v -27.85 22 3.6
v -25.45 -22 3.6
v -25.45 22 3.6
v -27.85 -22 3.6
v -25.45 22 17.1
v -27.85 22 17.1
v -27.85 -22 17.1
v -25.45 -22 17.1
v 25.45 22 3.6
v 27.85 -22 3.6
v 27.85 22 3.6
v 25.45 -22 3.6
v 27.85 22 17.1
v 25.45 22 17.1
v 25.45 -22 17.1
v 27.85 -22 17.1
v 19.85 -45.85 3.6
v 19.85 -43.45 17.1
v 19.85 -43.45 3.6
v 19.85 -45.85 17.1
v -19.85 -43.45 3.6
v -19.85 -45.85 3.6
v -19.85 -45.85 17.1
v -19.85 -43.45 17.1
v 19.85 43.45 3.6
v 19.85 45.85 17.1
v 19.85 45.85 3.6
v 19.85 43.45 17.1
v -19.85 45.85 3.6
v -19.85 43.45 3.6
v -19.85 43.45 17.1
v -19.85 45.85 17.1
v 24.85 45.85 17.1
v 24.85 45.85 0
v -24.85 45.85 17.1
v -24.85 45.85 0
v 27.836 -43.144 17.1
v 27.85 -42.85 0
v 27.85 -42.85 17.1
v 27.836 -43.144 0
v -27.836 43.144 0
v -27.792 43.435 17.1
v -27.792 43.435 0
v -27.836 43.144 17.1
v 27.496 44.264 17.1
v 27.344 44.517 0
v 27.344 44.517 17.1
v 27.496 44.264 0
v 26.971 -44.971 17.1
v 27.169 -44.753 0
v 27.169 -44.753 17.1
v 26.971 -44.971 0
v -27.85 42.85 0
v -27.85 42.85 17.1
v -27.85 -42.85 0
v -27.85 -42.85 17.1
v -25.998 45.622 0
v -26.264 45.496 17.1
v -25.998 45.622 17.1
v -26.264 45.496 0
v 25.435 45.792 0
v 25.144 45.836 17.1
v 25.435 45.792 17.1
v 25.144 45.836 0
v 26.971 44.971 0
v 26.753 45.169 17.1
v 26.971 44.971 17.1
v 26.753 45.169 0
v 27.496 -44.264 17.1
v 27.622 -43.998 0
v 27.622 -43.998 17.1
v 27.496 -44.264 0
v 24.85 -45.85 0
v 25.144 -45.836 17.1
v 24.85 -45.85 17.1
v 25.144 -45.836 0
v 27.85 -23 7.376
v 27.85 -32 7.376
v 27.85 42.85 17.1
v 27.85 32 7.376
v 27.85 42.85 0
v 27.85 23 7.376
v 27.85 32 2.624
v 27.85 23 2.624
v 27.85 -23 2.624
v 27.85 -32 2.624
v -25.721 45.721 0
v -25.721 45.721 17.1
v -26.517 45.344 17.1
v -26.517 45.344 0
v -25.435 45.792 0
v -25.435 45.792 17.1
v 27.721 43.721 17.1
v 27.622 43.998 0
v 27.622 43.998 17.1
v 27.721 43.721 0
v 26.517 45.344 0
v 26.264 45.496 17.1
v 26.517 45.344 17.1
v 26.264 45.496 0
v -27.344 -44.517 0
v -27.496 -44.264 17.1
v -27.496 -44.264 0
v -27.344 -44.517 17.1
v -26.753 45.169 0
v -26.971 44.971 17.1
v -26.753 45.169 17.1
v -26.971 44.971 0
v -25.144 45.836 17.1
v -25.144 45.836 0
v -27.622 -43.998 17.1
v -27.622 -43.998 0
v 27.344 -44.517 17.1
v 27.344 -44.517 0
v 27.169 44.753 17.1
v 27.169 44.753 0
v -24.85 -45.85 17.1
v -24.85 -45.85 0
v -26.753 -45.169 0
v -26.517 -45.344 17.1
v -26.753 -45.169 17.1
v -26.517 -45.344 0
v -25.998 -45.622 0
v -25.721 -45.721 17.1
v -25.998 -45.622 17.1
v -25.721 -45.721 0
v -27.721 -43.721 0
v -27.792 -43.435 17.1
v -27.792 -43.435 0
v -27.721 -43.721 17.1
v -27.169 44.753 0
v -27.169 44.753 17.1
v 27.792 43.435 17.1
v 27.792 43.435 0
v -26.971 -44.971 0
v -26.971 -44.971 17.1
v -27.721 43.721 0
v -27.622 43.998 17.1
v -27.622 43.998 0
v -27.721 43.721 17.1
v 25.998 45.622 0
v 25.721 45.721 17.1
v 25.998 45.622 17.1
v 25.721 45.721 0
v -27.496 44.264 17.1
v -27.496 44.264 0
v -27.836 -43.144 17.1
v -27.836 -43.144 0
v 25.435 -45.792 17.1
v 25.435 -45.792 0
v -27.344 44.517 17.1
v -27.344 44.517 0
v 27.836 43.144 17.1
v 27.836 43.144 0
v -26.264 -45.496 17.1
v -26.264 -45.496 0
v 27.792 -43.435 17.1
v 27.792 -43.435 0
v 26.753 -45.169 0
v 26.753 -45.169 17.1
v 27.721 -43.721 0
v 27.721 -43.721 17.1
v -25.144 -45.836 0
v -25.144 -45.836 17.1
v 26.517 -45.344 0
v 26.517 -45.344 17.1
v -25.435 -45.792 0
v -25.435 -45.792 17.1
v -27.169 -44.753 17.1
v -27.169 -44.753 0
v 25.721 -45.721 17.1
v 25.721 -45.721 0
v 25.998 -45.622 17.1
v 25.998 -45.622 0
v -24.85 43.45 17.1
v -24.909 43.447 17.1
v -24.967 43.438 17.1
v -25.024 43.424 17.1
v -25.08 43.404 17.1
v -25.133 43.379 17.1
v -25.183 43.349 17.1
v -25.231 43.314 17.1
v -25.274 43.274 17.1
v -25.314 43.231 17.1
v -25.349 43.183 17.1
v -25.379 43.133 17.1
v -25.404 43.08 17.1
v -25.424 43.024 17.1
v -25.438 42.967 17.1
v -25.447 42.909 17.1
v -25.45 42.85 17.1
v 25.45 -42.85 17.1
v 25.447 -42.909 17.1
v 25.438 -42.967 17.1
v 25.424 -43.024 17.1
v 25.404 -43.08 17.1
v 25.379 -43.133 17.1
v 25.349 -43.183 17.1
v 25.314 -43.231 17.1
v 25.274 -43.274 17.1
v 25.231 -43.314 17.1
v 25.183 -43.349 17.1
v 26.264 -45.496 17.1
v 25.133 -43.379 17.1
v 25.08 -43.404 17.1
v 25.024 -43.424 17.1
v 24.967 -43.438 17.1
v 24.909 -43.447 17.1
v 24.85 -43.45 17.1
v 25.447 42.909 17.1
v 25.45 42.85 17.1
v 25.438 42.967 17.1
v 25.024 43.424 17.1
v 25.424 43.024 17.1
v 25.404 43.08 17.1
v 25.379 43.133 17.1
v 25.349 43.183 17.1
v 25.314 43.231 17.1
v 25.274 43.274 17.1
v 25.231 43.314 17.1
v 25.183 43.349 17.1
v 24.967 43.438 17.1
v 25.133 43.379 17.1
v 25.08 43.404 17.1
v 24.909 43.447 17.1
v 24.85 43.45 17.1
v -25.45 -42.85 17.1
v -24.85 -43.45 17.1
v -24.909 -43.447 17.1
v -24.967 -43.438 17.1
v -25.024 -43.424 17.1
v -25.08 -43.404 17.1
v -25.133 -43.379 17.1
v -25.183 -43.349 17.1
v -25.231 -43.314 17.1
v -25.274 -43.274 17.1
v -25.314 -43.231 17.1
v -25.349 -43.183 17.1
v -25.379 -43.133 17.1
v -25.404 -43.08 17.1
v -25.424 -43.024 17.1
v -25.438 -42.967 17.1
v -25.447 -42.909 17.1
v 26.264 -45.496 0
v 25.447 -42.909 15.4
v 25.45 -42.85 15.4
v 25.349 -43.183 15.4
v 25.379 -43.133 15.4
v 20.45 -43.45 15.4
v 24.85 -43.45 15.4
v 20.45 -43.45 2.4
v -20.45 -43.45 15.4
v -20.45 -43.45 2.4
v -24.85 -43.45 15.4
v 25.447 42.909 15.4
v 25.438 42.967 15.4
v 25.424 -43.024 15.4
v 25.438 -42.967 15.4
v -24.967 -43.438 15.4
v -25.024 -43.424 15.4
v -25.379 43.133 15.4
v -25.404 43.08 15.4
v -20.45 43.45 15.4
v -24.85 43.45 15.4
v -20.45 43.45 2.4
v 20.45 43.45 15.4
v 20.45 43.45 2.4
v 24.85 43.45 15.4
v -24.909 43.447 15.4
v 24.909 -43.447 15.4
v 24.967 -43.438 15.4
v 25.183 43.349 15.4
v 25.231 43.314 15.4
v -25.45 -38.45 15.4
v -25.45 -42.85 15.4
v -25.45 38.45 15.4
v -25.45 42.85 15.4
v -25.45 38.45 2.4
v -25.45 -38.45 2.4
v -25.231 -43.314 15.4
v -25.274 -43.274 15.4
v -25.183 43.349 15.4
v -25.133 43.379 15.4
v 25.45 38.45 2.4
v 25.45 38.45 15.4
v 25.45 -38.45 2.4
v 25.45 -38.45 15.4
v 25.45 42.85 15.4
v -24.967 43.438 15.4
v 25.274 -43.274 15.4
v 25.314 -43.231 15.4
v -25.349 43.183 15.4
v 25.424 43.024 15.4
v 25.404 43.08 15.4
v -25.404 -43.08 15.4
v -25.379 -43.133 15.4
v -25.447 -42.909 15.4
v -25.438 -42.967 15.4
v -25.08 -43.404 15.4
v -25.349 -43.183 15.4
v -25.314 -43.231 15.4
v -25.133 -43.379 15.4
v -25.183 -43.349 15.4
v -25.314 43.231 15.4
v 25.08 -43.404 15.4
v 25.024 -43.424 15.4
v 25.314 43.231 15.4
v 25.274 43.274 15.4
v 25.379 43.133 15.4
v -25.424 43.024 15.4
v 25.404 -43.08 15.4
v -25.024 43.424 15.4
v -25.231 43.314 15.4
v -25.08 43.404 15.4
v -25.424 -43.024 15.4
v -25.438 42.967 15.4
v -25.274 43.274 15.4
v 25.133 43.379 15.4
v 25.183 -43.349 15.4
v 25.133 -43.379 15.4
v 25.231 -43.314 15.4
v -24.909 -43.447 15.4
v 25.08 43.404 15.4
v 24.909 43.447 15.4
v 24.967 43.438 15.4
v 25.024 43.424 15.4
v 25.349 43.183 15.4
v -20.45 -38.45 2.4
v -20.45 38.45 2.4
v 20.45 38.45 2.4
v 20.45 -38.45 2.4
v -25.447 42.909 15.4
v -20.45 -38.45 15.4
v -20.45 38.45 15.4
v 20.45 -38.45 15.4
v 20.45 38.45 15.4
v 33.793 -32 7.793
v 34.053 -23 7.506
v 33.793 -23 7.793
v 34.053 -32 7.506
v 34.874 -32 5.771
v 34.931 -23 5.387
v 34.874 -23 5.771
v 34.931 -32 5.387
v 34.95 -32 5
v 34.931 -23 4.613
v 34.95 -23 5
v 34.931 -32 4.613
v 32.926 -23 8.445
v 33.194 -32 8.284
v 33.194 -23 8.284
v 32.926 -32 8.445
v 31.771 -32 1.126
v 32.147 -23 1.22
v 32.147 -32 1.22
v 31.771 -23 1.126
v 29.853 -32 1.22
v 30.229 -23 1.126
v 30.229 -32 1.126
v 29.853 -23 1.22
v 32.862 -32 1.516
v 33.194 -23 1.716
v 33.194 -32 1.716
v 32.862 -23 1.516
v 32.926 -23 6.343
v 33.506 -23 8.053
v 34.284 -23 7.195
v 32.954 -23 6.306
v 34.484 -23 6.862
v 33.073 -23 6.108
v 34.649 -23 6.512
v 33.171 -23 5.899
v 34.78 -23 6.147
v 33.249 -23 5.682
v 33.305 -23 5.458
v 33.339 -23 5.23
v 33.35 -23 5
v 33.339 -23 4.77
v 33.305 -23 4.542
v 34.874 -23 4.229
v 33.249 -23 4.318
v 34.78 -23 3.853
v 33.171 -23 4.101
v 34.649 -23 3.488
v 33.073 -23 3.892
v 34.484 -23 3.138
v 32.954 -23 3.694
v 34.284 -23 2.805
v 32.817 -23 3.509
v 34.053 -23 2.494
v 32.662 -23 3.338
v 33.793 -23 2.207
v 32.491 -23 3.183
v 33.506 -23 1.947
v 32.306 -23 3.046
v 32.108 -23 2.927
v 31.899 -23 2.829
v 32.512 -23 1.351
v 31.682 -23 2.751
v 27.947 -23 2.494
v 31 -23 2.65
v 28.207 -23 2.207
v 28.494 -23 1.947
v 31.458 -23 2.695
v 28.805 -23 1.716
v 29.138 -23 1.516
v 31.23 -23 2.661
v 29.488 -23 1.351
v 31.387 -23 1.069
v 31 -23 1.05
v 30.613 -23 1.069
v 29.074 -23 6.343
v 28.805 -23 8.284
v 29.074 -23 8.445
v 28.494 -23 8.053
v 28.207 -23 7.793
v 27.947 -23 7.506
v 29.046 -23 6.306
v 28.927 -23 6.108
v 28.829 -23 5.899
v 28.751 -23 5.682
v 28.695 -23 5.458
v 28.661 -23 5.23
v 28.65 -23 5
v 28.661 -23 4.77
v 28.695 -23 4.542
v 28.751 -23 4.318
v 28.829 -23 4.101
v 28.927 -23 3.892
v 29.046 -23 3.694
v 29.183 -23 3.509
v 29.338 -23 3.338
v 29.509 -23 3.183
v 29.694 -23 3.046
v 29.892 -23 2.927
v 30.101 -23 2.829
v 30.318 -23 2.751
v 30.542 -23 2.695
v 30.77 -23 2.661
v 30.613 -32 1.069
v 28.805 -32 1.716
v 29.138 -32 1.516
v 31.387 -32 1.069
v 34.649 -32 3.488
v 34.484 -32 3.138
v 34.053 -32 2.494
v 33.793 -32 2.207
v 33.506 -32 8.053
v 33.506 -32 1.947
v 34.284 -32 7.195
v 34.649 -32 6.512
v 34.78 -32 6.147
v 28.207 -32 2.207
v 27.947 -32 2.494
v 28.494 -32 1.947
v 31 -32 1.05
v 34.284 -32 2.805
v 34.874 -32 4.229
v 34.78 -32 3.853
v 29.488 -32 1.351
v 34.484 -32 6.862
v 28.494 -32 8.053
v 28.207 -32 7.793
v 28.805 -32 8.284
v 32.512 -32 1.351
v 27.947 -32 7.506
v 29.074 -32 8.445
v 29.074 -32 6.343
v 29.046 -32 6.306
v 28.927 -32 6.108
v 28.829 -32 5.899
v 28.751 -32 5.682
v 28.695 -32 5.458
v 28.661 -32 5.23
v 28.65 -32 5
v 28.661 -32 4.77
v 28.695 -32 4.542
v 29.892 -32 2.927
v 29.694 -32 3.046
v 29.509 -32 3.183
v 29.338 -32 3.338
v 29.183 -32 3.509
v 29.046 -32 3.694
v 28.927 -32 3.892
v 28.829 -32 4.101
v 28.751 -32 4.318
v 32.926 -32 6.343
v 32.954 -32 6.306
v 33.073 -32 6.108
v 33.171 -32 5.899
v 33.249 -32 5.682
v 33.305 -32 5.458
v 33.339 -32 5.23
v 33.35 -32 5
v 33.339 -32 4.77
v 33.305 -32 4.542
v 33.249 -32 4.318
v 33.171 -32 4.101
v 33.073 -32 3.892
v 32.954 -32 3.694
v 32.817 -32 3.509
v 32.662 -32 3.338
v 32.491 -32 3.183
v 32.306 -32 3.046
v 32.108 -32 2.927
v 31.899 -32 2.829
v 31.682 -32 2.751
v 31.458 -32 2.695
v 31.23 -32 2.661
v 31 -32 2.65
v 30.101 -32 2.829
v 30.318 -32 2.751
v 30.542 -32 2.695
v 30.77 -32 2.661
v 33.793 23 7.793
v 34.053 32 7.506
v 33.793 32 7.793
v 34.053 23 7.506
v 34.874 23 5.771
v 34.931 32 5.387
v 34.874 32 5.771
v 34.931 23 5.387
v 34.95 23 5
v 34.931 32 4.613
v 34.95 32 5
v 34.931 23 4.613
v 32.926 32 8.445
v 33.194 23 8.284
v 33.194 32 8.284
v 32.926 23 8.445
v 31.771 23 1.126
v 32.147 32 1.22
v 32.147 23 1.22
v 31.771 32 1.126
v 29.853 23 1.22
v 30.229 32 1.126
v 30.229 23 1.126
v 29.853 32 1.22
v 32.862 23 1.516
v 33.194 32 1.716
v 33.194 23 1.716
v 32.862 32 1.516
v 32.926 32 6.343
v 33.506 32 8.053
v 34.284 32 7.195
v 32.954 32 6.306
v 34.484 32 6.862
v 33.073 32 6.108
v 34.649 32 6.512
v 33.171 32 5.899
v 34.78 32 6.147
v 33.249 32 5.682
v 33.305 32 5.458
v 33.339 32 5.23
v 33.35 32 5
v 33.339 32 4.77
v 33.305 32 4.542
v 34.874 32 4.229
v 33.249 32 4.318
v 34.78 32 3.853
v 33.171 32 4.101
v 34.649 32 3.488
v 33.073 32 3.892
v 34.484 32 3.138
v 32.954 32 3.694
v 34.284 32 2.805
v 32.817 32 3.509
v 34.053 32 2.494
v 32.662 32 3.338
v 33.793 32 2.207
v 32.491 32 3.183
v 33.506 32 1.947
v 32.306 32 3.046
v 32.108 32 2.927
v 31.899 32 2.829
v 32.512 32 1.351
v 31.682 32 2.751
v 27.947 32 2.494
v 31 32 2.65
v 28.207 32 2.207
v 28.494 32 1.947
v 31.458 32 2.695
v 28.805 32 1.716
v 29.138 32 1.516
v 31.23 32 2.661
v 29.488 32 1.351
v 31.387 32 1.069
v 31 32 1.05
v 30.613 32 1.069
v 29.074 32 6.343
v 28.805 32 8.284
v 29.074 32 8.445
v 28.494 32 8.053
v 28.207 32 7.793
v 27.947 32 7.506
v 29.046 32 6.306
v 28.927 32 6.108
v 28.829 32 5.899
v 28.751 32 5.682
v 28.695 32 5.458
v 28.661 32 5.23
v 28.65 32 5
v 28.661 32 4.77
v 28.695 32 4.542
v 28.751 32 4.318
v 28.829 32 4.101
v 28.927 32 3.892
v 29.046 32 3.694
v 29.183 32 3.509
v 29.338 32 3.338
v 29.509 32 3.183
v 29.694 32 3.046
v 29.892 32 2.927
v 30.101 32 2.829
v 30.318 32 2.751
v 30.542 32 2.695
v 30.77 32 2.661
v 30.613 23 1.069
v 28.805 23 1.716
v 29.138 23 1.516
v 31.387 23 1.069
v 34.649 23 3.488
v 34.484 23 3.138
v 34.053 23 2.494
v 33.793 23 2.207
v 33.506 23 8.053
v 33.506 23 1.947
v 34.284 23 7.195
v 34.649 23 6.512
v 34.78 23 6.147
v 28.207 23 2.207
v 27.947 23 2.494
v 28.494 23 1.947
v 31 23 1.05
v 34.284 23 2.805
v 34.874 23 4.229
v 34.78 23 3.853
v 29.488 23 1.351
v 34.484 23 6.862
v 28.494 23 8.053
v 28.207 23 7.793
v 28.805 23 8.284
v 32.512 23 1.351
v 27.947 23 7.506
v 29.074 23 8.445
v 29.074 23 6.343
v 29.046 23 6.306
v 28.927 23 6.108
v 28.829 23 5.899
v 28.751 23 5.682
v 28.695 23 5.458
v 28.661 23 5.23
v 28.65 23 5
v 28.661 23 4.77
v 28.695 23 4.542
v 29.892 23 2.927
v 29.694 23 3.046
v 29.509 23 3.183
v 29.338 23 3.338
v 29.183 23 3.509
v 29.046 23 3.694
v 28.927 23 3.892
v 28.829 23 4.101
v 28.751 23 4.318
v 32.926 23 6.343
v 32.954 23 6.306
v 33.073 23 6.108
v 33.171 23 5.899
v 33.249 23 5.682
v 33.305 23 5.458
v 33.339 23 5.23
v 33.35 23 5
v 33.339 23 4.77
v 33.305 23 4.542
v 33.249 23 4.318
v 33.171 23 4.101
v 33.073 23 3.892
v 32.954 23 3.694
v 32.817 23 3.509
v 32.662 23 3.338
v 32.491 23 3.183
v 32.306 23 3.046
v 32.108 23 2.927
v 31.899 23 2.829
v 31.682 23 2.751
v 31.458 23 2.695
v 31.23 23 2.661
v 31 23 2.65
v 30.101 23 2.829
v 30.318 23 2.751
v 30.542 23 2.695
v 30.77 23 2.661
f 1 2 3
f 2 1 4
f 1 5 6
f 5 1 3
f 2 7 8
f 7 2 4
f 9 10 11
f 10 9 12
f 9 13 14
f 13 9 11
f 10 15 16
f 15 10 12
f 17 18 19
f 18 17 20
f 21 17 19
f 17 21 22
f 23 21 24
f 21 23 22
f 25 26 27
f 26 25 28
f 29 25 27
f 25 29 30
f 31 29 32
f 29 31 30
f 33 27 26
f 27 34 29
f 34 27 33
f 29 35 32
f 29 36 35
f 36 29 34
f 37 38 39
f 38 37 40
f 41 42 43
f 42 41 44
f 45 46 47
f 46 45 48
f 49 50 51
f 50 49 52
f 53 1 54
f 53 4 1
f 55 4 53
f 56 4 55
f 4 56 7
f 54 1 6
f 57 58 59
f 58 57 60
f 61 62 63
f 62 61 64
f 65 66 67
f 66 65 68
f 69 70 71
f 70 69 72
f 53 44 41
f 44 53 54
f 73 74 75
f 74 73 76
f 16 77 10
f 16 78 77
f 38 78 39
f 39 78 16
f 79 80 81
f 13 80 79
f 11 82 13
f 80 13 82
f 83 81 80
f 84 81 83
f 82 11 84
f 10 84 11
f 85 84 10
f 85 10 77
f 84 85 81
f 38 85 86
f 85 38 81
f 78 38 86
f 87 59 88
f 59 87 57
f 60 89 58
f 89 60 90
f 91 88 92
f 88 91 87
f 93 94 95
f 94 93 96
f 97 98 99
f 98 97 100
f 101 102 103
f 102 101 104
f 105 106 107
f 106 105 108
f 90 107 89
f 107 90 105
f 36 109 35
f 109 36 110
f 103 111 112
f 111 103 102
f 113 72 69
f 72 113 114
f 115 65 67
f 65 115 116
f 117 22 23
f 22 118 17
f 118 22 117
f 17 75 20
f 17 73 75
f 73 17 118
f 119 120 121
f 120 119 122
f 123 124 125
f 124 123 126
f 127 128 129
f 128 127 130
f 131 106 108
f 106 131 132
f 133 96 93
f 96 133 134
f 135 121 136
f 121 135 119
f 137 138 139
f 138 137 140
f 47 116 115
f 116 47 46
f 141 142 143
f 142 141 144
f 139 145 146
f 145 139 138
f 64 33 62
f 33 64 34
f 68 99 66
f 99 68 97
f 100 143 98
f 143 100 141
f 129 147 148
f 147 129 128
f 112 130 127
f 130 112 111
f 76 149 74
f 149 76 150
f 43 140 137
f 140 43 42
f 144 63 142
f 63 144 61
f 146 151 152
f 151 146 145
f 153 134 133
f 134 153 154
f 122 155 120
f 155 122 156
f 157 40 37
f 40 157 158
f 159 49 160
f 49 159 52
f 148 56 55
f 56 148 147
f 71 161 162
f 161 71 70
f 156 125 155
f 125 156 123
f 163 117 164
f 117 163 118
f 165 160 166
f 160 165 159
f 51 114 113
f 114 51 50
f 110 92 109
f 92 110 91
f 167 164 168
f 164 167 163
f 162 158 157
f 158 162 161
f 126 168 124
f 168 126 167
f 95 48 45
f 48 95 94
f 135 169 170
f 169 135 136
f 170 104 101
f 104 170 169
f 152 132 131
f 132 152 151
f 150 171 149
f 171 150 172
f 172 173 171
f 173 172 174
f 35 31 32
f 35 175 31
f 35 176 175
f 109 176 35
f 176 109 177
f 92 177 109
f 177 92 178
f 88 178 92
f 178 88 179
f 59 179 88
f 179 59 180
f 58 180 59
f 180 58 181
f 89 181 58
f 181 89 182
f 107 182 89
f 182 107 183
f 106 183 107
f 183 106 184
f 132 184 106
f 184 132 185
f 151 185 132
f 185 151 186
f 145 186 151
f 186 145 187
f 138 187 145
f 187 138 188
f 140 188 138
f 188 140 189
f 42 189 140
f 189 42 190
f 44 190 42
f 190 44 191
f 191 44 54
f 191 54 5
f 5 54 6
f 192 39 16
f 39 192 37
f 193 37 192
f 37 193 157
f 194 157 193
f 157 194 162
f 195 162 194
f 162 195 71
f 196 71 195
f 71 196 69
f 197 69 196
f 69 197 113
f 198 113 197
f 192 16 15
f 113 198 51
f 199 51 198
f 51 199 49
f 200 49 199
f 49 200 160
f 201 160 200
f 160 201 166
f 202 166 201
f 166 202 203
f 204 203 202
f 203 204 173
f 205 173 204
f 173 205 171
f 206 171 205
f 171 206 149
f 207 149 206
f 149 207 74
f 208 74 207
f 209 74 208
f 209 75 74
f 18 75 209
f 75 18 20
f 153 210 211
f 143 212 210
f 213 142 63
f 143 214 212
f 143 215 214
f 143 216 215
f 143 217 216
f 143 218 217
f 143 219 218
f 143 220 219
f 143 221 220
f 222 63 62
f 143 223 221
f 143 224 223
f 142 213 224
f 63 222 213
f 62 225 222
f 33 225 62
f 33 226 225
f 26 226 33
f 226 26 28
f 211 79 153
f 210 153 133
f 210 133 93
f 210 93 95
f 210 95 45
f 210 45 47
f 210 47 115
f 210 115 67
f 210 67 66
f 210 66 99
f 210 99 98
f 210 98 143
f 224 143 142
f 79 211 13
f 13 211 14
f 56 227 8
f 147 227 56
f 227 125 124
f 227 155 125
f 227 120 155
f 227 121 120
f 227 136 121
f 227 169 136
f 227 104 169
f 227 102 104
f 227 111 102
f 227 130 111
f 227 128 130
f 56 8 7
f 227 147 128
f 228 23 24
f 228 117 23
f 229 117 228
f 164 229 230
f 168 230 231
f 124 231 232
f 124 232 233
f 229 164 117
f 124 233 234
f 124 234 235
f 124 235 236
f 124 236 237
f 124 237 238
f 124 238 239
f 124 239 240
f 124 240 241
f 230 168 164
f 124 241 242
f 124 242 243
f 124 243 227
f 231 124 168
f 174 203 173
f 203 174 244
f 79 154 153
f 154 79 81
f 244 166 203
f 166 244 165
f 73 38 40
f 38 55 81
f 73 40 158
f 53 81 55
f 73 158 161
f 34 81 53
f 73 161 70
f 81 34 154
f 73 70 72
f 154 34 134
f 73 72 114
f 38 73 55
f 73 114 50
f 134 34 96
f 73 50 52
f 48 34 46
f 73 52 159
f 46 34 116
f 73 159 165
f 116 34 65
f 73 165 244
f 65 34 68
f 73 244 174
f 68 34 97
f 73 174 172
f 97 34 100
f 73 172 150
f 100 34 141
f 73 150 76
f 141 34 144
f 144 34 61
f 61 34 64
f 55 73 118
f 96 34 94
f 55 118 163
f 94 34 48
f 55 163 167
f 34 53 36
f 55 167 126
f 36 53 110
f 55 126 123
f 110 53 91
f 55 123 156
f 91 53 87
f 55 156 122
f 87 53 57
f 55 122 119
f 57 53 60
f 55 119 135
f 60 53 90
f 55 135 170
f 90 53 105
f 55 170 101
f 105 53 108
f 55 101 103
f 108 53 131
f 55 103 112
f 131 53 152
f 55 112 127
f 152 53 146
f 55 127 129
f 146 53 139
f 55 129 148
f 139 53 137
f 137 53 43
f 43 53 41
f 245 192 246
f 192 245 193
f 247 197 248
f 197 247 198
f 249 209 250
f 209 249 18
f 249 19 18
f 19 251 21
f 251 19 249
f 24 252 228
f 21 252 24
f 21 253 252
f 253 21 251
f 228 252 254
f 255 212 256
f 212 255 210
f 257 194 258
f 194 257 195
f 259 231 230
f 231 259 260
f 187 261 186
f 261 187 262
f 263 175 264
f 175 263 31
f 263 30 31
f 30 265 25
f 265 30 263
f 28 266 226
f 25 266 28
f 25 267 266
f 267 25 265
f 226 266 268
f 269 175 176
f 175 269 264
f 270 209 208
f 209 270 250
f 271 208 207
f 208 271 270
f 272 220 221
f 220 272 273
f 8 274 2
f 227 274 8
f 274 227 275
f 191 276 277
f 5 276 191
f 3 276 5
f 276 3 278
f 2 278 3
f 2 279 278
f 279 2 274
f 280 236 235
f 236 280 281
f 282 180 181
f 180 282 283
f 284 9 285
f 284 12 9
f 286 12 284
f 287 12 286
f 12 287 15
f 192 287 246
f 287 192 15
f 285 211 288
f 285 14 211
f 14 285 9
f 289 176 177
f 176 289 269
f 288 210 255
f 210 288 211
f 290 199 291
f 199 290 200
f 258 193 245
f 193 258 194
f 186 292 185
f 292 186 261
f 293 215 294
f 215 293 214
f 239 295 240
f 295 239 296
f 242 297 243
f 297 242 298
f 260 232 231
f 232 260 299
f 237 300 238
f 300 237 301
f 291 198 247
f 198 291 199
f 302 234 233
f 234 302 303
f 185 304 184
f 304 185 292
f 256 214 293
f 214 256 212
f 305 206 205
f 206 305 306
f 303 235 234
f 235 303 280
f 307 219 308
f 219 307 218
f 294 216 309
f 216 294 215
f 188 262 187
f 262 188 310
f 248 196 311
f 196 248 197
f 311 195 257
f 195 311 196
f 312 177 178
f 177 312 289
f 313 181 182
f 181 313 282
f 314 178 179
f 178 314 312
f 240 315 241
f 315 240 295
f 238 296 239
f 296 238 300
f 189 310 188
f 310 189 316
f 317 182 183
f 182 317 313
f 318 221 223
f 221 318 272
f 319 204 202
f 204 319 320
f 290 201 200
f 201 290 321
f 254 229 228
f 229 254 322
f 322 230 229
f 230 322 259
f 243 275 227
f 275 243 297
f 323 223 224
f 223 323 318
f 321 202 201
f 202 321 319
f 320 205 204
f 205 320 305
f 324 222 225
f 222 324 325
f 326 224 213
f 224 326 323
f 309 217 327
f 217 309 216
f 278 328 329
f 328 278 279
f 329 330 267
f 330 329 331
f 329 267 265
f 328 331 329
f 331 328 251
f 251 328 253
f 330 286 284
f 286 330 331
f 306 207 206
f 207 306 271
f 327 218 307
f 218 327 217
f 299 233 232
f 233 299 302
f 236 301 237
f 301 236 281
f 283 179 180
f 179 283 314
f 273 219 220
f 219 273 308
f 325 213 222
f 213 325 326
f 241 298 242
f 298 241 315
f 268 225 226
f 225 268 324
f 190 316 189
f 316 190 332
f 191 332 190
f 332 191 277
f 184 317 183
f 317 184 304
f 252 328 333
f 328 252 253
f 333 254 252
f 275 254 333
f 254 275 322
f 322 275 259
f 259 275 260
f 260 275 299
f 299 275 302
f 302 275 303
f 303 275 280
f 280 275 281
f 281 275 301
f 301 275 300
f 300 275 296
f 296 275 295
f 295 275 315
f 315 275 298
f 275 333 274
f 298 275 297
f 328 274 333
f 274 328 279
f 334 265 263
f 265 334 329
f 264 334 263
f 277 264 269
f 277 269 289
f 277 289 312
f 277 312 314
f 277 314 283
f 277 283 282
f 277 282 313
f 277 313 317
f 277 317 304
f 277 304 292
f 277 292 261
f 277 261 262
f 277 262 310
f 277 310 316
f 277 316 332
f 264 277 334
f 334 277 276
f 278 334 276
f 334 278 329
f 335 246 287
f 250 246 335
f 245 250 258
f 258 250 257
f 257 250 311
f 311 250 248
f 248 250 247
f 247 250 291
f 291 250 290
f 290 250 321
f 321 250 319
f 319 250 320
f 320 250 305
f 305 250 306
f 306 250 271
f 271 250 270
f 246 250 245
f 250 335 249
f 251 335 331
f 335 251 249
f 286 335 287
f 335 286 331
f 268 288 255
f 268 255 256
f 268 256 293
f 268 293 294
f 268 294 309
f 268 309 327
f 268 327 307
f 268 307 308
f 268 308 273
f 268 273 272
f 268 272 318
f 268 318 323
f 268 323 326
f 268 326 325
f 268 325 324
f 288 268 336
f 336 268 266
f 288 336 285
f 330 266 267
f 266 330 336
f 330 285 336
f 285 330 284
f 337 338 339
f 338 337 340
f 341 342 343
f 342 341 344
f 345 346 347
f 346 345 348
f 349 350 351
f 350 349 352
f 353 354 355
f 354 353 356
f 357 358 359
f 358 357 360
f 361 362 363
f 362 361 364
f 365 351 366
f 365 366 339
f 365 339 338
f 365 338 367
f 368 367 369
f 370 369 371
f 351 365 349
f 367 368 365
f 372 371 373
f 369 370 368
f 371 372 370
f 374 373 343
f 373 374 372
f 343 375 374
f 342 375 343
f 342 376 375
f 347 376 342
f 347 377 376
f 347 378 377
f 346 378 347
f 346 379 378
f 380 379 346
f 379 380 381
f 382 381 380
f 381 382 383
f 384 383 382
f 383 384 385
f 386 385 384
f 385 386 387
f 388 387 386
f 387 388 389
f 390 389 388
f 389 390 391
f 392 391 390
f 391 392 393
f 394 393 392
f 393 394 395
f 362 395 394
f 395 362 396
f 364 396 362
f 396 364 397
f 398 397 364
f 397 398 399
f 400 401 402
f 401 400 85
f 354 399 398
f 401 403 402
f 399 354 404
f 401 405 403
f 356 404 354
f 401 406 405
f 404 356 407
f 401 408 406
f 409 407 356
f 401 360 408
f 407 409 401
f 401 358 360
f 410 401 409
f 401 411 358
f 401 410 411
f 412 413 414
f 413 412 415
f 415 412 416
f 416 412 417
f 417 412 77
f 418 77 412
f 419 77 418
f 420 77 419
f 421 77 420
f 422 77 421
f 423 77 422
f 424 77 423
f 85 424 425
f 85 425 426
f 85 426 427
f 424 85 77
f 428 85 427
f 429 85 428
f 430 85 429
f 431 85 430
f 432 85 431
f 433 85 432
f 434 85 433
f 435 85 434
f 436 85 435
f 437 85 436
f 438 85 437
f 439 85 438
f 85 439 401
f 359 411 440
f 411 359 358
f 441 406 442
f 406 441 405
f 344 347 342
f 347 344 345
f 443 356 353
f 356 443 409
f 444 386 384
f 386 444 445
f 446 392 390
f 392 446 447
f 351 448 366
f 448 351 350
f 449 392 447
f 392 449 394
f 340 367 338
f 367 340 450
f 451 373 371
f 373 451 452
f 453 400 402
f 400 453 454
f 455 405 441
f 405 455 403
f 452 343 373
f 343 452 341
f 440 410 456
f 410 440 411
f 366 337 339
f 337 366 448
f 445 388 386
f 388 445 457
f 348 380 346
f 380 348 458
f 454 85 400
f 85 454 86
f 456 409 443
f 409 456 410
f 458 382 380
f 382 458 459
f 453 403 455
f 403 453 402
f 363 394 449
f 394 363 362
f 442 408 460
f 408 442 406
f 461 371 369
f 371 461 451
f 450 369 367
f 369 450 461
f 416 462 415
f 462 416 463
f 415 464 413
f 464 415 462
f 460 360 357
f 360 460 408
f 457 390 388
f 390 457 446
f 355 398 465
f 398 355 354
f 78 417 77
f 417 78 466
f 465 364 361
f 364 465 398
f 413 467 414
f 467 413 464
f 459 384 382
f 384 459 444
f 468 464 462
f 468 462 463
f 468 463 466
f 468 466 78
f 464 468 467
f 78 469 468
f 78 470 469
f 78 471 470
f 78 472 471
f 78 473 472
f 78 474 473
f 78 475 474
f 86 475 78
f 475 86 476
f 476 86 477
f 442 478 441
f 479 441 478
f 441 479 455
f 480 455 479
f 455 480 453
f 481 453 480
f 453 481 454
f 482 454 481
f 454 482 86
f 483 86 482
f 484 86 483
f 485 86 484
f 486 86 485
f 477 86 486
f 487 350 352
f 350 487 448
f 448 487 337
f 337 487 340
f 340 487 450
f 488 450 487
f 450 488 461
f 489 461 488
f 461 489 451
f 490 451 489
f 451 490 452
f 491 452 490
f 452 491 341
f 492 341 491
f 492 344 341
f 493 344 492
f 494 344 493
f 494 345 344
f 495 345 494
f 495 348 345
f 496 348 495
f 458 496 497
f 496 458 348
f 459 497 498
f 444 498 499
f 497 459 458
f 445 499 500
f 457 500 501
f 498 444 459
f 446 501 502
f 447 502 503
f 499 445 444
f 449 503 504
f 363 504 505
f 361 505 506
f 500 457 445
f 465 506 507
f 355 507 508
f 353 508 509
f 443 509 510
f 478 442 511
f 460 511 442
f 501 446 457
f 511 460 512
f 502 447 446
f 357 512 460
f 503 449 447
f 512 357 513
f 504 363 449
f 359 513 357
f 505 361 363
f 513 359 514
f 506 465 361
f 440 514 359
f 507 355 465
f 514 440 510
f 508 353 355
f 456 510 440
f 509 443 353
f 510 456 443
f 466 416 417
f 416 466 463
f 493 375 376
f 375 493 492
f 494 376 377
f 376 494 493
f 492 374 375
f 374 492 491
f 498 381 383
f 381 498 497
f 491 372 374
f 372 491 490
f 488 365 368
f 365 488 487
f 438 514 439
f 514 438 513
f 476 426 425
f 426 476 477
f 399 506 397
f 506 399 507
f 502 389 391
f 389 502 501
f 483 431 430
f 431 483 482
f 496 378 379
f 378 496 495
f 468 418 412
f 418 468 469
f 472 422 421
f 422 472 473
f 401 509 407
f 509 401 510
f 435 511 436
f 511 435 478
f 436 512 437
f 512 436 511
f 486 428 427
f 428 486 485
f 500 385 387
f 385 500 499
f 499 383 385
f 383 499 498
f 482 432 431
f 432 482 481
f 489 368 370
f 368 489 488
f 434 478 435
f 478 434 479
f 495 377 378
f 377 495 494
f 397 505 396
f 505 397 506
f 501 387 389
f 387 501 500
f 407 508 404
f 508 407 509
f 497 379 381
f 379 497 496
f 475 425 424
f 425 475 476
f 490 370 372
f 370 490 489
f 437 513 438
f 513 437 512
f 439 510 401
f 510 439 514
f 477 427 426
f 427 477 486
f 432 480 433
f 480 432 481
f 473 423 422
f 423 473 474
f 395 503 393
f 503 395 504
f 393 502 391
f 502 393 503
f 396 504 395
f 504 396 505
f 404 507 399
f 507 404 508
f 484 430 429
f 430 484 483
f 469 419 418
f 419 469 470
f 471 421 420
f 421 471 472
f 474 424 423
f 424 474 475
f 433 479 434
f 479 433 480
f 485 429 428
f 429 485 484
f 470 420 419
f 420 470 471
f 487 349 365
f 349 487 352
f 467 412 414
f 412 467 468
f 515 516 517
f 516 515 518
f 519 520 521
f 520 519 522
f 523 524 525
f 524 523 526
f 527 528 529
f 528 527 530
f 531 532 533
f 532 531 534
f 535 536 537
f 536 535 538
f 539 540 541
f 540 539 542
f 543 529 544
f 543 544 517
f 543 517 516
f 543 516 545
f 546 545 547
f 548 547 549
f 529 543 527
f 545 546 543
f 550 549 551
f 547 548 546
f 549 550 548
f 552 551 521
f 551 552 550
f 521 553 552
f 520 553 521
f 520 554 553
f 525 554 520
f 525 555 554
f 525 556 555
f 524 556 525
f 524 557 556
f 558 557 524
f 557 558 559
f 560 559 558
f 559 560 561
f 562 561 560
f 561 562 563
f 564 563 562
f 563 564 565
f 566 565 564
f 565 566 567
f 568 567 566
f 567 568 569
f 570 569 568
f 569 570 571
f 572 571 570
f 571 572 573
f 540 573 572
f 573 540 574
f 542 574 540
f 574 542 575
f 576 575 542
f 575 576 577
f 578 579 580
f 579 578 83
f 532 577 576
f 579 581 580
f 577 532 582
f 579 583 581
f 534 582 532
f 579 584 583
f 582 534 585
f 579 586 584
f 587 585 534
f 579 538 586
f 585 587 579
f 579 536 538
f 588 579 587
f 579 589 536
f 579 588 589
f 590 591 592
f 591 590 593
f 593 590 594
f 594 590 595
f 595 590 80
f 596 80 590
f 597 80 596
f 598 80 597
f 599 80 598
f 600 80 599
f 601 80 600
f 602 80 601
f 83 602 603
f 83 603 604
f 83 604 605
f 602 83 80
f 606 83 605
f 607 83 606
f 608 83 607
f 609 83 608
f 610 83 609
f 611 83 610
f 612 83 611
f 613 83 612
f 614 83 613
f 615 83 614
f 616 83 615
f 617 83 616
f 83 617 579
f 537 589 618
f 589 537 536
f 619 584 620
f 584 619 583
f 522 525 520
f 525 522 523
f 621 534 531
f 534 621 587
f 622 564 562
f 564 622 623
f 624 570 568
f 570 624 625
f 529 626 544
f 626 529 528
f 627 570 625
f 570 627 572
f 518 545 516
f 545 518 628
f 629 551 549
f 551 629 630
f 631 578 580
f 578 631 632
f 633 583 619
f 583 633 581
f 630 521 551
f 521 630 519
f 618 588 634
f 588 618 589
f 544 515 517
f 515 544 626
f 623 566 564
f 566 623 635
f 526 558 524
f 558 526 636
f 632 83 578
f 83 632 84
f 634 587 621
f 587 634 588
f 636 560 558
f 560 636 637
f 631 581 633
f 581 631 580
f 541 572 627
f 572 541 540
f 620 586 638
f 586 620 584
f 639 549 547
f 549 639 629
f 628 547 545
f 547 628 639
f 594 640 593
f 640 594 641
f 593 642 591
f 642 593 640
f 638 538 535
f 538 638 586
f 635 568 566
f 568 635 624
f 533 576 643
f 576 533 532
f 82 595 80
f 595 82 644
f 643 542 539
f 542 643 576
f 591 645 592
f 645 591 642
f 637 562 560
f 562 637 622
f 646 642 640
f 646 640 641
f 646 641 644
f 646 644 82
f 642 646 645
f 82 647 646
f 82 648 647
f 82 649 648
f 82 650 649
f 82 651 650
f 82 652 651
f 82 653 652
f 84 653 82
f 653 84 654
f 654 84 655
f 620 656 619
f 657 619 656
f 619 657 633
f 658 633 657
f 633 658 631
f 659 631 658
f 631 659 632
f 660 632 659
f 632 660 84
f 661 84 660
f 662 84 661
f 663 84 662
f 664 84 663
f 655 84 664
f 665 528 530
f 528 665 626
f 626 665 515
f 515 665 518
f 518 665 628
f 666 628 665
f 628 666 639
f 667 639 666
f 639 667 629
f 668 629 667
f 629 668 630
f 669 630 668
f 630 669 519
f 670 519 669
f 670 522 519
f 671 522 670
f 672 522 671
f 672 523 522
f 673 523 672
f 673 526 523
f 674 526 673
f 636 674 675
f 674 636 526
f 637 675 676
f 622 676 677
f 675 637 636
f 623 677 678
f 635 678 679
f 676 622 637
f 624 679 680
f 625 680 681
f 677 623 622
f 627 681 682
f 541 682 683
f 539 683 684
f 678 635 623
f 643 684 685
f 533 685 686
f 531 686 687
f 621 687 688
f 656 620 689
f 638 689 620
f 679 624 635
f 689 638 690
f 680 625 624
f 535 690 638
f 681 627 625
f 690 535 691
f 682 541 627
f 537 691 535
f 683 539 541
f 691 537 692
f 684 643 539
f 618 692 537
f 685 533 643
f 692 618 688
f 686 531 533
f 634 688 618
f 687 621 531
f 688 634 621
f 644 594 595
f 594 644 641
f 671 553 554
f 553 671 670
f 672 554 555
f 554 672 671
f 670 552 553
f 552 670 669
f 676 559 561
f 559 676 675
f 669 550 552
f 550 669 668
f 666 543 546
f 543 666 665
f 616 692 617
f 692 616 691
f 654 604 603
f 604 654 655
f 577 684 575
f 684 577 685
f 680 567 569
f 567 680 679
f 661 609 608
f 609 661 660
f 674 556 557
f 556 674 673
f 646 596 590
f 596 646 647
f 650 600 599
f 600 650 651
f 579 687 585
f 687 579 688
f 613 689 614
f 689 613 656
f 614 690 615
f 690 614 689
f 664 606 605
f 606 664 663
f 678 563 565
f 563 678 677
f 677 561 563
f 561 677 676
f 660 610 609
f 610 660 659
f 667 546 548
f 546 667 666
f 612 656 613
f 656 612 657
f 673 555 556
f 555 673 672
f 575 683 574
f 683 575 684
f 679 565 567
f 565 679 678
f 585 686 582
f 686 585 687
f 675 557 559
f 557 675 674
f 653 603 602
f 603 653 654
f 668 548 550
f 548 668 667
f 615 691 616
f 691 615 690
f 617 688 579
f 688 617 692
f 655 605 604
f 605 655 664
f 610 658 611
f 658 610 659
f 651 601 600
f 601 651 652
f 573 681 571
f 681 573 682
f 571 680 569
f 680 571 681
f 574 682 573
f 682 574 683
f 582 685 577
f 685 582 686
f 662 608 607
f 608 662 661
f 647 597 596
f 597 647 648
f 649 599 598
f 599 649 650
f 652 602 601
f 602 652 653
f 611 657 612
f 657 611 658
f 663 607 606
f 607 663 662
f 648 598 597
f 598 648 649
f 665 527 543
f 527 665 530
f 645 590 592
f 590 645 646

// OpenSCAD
// file: _esp32_display_case.scad
// =====================================
// ESP32-2432S028R display case ("Cheap Yellow Display" / CYD)
// Two-part snap-fit enclosure for the 2.8" 240x320 resistive-touch TFT board,
// with an integrated snap-in holder for the bundled touchscreen stylus.
// =====================================
// Parts:
//   case_back  -> case_back.stl   (rear shell + two stylus saddle clips)
//   case_front -> case_front.stl  (front bezel with display window + snap skirt)
//
// Orientation: both parts are modeled upright in print orientation (Z-up),
// origin-centred on X/Y with their base at z=0. No viewer rotation is applied
// (analogous to sink-tray / hex-connector).
//
// Board dimensions are published CYD community specs, NOT calipered — they are
// flagged "VERIFY w/ calipers" below and exposed as customizer parameters, so a
// test print should confirm board fit before a final print. The stylus numbers
// (pen_*) ARE measured from the caliper photos in issue #268.

$fn = 64;

// === Parameters (mm) ===

// --- Board (VERIFY w/ calipers; published ESP32-2432S028R specs) ---
board_w         = 50.5;  // PCB short-edge width (spec ~50.3)
board_l         = 86.5;  // PCB long-edge length (spec ~86.4)
pcb_thickness   = 1.7;
component_depth = 13;    // cavity depth below PCB back for ESP32/USB/JST

// --- Fit / walls ---
fit_clearance   = 0.4;   // total slack board-edge to wall (0.2/side)
wall            = 2.4;
corner_r        = 3;
post_size       = 5;     // corner support-post footprint (square)

// --- Front bezel ---
bezel_thickness = 2.4;
skirt_depth     = 6;
skirt_wall      = 2.0;
skirt_clearance = 0.3;

// --- Display window (2.8" active ~43.2 x 57.6; VERIFY) ---
window_w        = 44;
window_l        = 58;
window_off_w    = 0;
window_off_l    = 0;

// --- Wall port cutouts (generous; connector positions unknown) ---
corner_margin   = 8;     // solid material at each wall end
floor_rail      = 1.2;   // thin rail at bottom of each side cutout

// --- Touchscreen stylus holder (measured w/ calipers) ---
pen_holder      = true;  // toggle the stylus clips
pen_dia         = 4.1;   // stylus shaft diameter (measured 4.07)
pen_clip_clear  = 0.3;   // radial slack, clip bore vs shaft
pen_clip_grip   = 220;   // clip arc sweep, degrees (>180 retains the pen)
pen_clip_wall   = 1.6;   // clip wall thickness
pen_clip_len    = 9;     // length of each clip along the pen axis
pen_clip_span   = 55;    // center-to-center distance between the two clips
pen_clip_z      = 5;     // clip center height above shell floor

// === Derived ===
inner_w  = board_w + fit_clearance;
inner_l  = board_l + fit_clearance;
outer_w  = inner_w + 2 * wall;
outer_l  = inner_l + 2 * wall;
cavity_h = component_depth + pcb_thickness;
shell_h  = wall + cavity_h;

pen_ri = pen_dia / 2 + pen_clip_clear;   // clip bore radius
pen_ro = pen_ri + pen_clip_wall;         // clip outer radius

// Side-wall vent slot: from just above the floor rail up to the top rim.
vent_z0 = wall + floor_rail;
vent_h  = shell_h - vent_z0 + 0.1;
// The long (X) walls carry the stylus clips, so their vent is kept short enough
// to sit between the two clip footprints; the short (Y) walls vent the full
// span less the corner margins.
xvent_l = pen_holder ? max(0, pen_clip_span - pen_clip_len - 2)
                     : outer_l - 2 * corner_margin;
yvent_l = outer_w - 2 * corner_margin;

// === Modules ===

// Rounded-rect vertical prism: hull of four corner cylinders.
// Centred on X/Y, base at z=0.
module rbox(w, l, h, r) {
    hull()
        for (sx = [-1, 1], sy = [-1, 1])
            translate([sx * (w/2 - r), sy * (l/2 - r), 0])
                cylinder(r = r, h = h);
}

// One stylus saddle clip. Axis along Y, centred at origin, mouth opening
// facing +Z so the pen drops in from above (support-free print).
// The C wraps pen_clip_grip degrees; the top opening is 360 - pen_clip_grip.
module pen_clip(len) {
    // Mouth half-width, measured at the pen surface so the opening is narrower
    // than the pen (and therefore retains it) exactly when pen_clip_grip > 180.
    hw = (pen_dia / 2) * sin((360 - pen_clip_grip) / 2);
    difference() {
        rotate([90, 0, 0]) cylinder(r = pen_ro, h = len, center = true);
        // Bore (overshoot both ends in Y)
        rotate([90, 0, 0]) cylinder(r = pen_ri, h = len + 0.2, center = true);
        // Cut the top opening: remove the top region within the mouth width.
        translate([0, 0, (pen_ro + 1) / 2])
            cube([2 * hw, len + 0.2, pen_ro + 1], center = true);
    }
}

// Rear shell: origin-centred, base at z=0, opening toward +Z. Holds the board
// components and carries the two stylus clips on the +X long wall.
module case_back() {
    union() {
        difference() {
            // Outer solid
            rbox(outer_w, outer_l, shell_h, corner_r);

            // Interior cavity (from top of the floor up)
            translate([0, 0, wall])
                rbox(inner_w, inner_l, cavity_h + 0.1, max(0.5, corner_r - wall));

            // Side-wall port/vent cutouts — one centred per wall, cut fully
            // through the wall, floor_rail retained at the bottom.
            // +/-X long walls (span along Y); kept clear of the stylus clips.
            for (sx = [-1, 1])
                translate([sx * (inner_w/2 + wall/2), 0, vent_z0 + vent_h/2])
                    cube([wall + 0.2, xvent_l, vent_h], center = true);
            // +/-Y short walls (span along X)
            for (sy = [-1, 1])
                translate([0, sy * (inner_l/2 + wall/2), vent_z0 + vent_h/2])
                    cube([yvent_l, wall + 0.2, vent_h], center = true);
        }

        // Corner support posts (added after the cavity cut so they stand
        // inside it). Outer faces sit flush with the cavity walls and fuse.
        for (sx = [-1, 1], sy = [-1, 1])
            translate([sx * (inner_w/2 - post_size/2),
                       sy * (inner_l/2 - post_size/2),
                       wall + component_depth/2])
                cube([post_size, post_size, component_depth], center = true);

        // Stylus clips on the +X exterior long wall. The -0.8 overlap sinks the
        // clip's outer arc into the wall so it fuses.
        if (pen_holder)
            for (sy = [-1, 1])
                translate([outer_w/2 + pen_ro - 0.8, sy * pen_clip_span/2, pen_clip_z])
                    pen_clip(pen_clip_len);
    }
}

// Front bezel: origin-centred, skirt bottom at z=0. A faceplate with a display
// window and a downward skirt that snaps over the rear shell exterior.
module case_front() {
    difference() {
        union() {
            // Faceplate cap
            translate([0, 0, skirt_depth])
                rbox(outer_w, outer_l, bezel_thickness, corner_r);

            // Skirt: outer wall minus the shell-shaped cavity it slides over
            difference() {
                rbox(outer_w + 2 * skirt_wall, outer_l + 2 * skirt_wall,
                     skirt_depth + bezel_thickness, corner_r + skirt_wall);
                translate([0, 0, -0.05])
                    rbox(outer_w + skirt_clearance, outer_l + skirt_clearance,
                         skirt_depth + 0.1, corner_r);
            }
        }

        // Display window through the faceplate
        translate([window_off_w, window_off_l, skirt_depth + bezel_thickness/2])
            cube([window_w, window_l, bezel_thickness + 1], center = true);
    }
}

// Rendered individually:
//   case_back.scad  -> case_back.stl
//   case_front.scad -> case_front.stl
// main file
// ESP32 display case - rear shell with integrated stylus clips
// Render this file to generate case_back.stl

include <_esp32_display_case.scad>

case_back();
